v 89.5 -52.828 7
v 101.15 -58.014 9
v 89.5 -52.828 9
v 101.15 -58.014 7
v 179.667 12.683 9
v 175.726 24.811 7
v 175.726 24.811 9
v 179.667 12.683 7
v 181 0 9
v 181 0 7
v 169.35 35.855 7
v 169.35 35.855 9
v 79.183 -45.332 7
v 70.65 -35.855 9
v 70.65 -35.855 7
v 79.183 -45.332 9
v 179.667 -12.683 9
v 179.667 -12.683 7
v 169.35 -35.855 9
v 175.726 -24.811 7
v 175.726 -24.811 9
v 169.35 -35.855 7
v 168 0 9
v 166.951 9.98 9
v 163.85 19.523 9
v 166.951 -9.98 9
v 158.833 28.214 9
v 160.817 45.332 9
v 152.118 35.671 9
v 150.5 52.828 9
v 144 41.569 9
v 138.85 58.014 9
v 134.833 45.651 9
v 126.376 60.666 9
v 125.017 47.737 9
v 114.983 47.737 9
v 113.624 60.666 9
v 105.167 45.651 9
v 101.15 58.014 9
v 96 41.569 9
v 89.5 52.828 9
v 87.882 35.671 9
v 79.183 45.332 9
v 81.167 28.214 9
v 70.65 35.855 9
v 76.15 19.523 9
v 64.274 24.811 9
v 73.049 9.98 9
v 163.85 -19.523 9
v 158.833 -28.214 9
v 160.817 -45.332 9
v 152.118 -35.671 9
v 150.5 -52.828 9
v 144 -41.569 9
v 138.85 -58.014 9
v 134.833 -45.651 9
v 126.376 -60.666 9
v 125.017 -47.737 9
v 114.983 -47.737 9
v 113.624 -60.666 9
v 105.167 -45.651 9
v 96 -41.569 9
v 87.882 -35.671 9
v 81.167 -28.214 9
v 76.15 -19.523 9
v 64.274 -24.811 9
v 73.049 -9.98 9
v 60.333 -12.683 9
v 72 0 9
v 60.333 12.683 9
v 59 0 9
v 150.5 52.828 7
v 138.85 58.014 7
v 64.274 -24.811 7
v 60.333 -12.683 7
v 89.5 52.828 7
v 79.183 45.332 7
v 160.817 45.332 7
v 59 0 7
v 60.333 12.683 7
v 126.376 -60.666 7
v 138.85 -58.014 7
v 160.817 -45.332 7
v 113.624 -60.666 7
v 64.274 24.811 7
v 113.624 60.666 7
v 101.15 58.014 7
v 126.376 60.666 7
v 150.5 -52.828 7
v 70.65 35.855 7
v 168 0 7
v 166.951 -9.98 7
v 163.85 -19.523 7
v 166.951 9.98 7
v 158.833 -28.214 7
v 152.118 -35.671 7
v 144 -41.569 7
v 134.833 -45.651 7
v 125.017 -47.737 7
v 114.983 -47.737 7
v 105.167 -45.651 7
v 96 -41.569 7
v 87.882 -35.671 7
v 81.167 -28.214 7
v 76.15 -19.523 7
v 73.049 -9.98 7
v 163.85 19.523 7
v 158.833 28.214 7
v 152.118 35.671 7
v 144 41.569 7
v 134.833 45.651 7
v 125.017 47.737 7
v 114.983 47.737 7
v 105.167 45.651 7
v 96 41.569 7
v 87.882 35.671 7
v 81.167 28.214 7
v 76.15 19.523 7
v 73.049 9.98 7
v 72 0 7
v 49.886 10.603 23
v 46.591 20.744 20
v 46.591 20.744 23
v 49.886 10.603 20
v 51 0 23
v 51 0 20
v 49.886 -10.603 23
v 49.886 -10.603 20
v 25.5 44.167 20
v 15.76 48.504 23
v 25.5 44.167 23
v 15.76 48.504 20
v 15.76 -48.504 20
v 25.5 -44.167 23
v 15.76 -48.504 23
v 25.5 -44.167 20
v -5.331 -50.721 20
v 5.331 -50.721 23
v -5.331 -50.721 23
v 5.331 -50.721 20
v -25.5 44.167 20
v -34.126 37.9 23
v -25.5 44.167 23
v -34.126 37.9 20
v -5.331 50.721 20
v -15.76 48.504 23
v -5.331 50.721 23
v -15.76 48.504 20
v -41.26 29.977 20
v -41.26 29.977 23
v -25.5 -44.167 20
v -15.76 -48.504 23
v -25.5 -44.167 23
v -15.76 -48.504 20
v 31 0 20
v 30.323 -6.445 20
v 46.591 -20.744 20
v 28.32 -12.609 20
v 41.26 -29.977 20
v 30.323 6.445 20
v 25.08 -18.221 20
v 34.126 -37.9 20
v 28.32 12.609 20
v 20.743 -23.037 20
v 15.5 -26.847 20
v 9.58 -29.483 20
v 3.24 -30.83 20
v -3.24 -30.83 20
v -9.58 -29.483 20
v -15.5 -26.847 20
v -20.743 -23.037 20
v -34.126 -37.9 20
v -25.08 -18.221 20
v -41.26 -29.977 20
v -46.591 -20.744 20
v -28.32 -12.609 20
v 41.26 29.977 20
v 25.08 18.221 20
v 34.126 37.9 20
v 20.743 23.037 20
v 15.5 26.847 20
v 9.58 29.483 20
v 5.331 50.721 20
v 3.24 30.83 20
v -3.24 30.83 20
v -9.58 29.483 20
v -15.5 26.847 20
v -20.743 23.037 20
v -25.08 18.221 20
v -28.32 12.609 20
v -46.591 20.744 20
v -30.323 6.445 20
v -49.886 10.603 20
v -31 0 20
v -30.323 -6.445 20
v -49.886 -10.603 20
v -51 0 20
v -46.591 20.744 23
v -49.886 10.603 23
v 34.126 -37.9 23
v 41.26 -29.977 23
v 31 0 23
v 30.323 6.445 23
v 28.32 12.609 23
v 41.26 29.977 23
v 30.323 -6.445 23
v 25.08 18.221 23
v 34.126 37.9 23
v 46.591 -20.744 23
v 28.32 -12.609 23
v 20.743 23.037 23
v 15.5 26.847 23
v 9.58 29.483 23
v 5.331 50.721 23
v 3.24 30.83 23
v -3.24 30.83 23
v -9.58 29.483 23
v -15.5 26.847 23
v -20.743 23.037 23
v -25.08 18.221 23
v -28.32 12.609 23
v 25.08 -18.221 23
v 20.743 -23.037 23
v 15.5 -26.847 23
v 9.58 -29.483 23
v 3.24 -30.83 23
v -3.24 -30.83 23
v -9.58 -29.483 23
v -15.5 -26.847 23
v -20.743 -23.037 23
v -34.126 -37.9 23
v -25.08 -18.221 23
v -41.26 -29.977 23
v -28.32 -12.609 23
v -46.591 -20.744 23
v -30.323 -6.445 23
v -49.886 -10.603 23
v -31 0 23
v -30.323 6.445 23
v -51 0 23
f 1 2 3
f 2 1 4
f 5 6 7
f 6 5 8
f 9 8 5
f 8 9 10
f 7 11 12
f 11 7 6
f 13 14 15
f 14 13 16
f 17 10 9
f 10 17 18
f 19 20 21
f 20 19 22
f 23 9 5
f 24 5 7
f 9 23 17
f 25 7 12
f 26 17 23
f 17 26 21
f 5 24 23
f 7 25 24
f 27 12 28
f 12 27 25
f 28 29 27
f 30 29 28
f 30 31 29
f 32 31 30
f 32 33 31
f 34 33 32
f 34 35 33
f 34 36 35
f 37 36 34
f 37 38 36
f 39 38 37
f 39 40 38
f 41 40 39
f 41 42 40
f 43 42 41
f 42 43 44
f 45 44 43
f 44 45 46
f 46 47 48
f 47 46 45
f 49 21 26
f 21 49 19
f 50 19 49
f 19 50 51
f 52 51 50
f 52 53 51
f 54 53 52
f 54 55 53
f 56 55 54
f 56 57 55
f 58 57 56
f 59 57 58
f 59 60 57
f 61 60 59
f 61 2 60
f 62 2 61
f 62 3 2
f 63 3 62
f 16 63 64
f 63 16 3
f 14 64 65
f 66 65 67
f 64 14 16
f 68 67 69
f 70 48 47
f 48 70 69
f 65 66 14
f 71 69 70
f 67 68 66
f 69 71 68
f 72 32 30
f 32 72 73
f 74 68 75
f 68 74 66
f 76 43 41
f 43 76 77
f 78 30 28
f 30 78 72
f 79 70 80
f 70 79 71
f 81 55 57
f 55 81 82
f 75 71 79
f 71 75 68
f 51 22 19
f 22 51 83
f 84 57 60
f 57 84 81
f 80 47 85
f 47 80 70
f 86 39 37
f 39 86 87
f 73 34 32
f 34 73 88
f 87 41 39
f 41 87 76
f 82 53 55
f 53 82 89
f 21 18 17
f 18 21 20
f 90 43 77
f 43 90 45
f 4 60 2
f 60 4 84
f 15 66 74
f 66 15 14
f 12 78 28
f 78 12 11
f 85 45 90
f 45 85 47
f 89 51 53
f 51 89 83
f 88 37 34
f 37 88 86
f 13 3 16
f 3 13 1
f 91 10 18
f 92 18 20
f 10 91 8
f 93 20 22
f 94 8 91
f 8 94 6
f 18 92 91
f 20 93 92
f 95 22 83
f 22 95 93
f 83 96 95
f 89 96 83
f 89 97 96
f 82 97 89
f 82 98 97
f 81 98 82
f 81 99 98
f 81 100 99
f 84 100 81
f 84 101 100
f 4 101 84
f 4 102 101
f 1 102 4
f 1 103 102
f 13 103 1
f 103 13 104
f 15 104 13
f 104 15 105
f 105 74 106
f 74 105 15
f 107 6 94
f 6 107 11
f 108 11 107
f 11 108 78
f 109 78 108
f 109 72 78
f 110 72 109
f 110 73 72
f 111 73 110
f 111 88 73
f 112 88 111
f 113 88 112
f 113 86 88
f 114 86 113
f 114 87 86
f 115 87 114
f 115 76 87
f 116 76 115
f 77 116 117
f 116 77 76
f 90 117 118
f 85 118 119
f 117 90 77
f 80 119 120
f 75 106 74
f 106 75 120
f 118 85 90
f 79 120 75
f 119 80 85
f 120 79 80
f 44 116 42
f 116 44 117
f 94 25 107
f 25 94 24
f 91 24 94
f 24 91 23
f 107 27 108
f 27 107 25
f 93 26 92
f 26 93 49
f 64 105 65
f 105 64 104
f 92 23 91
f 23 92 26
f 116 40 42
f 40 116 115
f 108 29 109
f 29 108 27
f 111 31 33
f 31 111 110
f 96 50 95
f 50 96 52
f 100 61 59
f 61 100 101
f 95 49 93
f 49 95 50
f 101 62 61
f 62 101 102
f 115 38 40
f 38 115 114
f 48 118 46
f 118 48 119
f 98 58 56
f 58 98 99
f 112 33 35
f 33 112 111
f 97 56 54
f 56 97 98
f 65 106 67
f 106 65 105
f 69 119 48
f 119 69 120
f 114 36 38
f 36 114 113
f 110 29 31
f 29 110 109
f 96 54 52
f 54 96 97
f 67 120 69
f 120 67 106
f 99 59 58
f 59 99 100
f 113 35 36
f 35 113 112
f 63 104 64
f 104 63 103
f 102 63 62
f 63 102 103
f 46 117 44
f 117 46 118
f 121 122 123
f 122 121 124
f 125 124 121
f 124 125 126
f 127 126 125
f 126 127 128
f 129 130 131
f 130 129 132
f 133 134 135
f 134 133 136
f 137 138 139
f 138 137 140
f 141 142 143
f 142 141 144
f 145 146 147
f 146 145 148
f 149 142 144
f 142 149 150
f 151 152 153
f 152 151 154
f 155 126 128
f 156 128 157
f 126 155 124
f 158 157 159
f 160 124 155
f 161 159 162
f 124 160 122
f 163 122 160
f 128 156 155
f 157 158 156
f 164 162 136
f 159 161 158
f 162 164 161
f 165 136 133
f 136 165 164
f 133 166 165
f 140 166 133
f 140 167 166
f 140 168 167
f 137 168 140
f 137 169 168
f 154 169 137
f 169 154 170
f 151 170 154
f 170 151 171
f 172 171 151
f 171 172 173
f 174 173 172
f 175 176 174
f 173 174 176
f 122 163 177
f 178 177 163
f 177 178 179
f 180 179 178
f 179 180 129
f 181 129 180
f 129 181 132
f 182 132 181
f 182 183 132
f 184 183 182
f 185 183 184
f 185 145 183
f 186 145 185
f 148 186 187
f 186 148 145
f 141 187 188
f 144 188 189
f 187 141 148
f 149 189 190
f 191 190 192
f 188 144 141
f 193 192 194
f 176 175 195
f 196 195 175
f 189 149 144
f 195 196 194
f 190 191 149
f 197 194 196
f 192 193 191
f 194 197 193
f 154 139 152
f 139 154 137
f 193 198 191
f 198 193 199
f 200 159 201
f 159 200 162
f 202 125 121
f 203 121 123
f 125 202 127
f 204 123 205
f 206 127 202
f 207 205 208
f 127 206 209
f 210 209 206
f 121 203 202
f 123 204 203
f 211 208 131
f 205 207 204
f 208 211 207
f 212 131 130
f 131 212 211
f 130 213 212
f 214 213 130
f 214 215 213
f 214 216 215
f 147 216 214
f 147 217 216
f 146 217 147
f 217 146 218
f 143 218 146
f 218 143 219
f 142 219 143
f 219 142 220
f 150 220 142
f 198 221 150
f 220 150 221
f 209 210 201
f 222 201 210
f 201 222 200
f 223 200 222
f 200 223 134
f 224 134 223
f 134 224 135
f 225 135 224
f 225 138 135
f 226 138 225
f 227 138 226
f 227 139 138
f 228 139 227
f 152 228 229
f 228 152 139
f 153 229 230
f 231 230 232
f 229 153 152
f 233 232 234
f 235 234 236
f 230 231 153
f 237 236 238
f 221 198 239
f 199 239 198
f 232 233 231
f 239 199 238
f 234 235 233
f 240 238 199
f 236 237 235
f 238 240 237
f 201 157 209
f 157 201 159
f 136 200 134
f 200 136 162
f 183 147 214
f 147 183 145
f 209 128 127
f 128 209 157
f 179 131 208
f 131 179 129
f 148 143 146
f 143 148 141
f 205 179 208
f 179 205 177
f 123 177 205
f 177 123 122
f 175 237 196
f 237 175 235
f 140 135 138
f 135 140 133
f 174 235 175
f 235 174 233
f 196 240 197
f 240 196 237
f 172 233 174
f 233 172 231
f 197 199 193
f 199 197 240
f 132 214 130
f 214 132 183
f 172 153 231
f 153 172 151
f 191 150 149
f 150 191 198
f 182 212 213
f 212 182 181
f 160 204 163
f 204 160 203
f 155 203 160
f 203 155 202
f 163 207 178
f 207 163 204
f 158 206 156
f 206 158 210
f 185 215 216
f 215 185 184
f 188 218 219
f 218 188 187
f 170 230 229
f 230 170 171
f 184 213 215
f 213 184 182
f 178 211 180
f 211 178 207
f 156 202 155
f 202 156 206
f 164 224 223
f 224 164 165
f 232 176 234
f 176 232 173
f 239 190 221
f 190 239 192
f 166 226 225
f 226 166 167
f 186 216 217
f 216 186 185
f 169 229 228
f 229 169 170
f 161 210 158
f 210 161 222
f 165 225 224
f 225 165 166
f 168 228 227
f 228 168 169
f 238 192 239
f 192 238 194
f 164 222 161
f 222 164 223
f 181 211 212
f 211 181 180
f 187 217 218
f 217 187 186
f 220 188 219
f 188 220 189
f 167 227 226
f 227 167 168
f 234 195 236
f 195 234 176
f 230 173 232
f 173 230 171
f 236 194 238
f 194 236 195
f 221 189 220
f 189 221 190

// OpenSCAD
// file: drain-cover.scad
module drain_cover(outer_radius, inner_radius, height)
{
    top_thin = 7;
    thin = 2;
    edge_len = outer_radius - inner_radius;

    // top
    translate(v = [ 0, 0, 0.5 * (height - top_thin) ])
        circular_net(radius = outer_radius, height = top_thin, outer_width = edge_len + thin, hole_width = 5);

    // side
    side_net(height = height, top_radius = inner_radius, thin = thin, hole_width = 2);

    // bottom
    translate(v = [ 0, 0, -0.5 * (height - thin) ])
        circular_net(radius = 0.8 * inner_radius, height = thin, outer_width = 2, hole_width = 2);
}

module side_net(height, top_radius, thin, hole_width)
{
    difference()
    {
        base_side(height = height, top_radius = top_radius, thin = thin);

        net_width = 0.8 * hole_width;
        d_radian = (hole_width + net_width) / (0.9 * top_radius);
        d_degree = d_radian * 180 / PI;
        for (angle = [0:d_degree:180])
        {
            rotate([ 0, 0, angle ]) cube(size = [ 2 * top_radius, hole_width, 0.9 * height ], center = true);
        }
    }
}

module base_side(height, top_radius, thin)
{
    difference()
    {
        cylinder(h = height, r1 = 0.8 * top_radius, r2 = top_radius, center = true);
        cylinder(h = height + 1, r1 = 0.8 * top_radius - thin, r2 = top_radius - thin, center = true);
    }
}

module circular_net(radius, height, outer_width, hole_width)
{
    center = true;

    // 外側の縁部分
    ring(outer_radius = radius, height = height, width = outer_width, center = center);

    // 同心円状の網部分
    net_width = 0.8 * hole_width;
    for (ring_radius = [radius - outer_width - hole_width:-(net_width + hole_width):0])
    {
        ring(outer_radius = ring_radius, height = height, width = net_width, center = center);
    }

    // 網を支える棒部分
    bar_num = 3;
    bar_width = 1.2 * hole_width;
    for (angle = [0:180 / bar_num:180])
    {
        rotate([ 0, 0, angle ]) cube(size = [ 2 * radius - outer_width, bar_width, height ], center = true);
    }
}

module ring(outer_radius, width, height, center)
{
    difference()
    {
        cylinder(h = height, r = outer_radius, center = center);
        cylinder(h = height + 1, r = outer_radius - width, center = center);
    }
}

drain_cover(outer_radius = 50, inner_radius = 35, height = 30);
// main file
use <drain-cover.scad>

module drain_cover_top(radius, edge_len, height, sharpness, top_thin, thin)
{
    side_height = height - top_thin;
    translate(v = [ 0, 0, side_height ])
    ring(
        outer_radius = radius,
        width = edge_len + thin,
        height = top_thin
    );
    side_net(
      radius = radius - edge_len,
      height = side_height,
      factorial = sharpness,
      thin = thin,
      hole_width = 10,
      net_width = 2
    );
}
module drain_cover_bottom(radius, edge_len, height, sharpness, top_thin, thin)
{
    side_height = height - top_thin;
    translate(v = [ 0, 0, side_height ])
    ring(
        outer_radius = radius,
        width = edge_len + thin,
        height = top_thin
    );
    side_net(
      radius = radius - edge_len,
      height = side_height,
      factorial = sharpness,
      thin = thin,
      hole_width = 2,
      net_width = 2
    );
}
translate(v = [ 120, 0, 0])
drain_cover_top(
  radius = 61,
  edge_len = 11,
  height = 9,
  sharpness= 4,
  top_thin = 2,
  thin = 2
);
drain_cover_bottom(
  radius = 51,
  edge_len = 18,
  height = 23,
  sharpness= 4,
  top_thin = 3,
  thin = 2
);
